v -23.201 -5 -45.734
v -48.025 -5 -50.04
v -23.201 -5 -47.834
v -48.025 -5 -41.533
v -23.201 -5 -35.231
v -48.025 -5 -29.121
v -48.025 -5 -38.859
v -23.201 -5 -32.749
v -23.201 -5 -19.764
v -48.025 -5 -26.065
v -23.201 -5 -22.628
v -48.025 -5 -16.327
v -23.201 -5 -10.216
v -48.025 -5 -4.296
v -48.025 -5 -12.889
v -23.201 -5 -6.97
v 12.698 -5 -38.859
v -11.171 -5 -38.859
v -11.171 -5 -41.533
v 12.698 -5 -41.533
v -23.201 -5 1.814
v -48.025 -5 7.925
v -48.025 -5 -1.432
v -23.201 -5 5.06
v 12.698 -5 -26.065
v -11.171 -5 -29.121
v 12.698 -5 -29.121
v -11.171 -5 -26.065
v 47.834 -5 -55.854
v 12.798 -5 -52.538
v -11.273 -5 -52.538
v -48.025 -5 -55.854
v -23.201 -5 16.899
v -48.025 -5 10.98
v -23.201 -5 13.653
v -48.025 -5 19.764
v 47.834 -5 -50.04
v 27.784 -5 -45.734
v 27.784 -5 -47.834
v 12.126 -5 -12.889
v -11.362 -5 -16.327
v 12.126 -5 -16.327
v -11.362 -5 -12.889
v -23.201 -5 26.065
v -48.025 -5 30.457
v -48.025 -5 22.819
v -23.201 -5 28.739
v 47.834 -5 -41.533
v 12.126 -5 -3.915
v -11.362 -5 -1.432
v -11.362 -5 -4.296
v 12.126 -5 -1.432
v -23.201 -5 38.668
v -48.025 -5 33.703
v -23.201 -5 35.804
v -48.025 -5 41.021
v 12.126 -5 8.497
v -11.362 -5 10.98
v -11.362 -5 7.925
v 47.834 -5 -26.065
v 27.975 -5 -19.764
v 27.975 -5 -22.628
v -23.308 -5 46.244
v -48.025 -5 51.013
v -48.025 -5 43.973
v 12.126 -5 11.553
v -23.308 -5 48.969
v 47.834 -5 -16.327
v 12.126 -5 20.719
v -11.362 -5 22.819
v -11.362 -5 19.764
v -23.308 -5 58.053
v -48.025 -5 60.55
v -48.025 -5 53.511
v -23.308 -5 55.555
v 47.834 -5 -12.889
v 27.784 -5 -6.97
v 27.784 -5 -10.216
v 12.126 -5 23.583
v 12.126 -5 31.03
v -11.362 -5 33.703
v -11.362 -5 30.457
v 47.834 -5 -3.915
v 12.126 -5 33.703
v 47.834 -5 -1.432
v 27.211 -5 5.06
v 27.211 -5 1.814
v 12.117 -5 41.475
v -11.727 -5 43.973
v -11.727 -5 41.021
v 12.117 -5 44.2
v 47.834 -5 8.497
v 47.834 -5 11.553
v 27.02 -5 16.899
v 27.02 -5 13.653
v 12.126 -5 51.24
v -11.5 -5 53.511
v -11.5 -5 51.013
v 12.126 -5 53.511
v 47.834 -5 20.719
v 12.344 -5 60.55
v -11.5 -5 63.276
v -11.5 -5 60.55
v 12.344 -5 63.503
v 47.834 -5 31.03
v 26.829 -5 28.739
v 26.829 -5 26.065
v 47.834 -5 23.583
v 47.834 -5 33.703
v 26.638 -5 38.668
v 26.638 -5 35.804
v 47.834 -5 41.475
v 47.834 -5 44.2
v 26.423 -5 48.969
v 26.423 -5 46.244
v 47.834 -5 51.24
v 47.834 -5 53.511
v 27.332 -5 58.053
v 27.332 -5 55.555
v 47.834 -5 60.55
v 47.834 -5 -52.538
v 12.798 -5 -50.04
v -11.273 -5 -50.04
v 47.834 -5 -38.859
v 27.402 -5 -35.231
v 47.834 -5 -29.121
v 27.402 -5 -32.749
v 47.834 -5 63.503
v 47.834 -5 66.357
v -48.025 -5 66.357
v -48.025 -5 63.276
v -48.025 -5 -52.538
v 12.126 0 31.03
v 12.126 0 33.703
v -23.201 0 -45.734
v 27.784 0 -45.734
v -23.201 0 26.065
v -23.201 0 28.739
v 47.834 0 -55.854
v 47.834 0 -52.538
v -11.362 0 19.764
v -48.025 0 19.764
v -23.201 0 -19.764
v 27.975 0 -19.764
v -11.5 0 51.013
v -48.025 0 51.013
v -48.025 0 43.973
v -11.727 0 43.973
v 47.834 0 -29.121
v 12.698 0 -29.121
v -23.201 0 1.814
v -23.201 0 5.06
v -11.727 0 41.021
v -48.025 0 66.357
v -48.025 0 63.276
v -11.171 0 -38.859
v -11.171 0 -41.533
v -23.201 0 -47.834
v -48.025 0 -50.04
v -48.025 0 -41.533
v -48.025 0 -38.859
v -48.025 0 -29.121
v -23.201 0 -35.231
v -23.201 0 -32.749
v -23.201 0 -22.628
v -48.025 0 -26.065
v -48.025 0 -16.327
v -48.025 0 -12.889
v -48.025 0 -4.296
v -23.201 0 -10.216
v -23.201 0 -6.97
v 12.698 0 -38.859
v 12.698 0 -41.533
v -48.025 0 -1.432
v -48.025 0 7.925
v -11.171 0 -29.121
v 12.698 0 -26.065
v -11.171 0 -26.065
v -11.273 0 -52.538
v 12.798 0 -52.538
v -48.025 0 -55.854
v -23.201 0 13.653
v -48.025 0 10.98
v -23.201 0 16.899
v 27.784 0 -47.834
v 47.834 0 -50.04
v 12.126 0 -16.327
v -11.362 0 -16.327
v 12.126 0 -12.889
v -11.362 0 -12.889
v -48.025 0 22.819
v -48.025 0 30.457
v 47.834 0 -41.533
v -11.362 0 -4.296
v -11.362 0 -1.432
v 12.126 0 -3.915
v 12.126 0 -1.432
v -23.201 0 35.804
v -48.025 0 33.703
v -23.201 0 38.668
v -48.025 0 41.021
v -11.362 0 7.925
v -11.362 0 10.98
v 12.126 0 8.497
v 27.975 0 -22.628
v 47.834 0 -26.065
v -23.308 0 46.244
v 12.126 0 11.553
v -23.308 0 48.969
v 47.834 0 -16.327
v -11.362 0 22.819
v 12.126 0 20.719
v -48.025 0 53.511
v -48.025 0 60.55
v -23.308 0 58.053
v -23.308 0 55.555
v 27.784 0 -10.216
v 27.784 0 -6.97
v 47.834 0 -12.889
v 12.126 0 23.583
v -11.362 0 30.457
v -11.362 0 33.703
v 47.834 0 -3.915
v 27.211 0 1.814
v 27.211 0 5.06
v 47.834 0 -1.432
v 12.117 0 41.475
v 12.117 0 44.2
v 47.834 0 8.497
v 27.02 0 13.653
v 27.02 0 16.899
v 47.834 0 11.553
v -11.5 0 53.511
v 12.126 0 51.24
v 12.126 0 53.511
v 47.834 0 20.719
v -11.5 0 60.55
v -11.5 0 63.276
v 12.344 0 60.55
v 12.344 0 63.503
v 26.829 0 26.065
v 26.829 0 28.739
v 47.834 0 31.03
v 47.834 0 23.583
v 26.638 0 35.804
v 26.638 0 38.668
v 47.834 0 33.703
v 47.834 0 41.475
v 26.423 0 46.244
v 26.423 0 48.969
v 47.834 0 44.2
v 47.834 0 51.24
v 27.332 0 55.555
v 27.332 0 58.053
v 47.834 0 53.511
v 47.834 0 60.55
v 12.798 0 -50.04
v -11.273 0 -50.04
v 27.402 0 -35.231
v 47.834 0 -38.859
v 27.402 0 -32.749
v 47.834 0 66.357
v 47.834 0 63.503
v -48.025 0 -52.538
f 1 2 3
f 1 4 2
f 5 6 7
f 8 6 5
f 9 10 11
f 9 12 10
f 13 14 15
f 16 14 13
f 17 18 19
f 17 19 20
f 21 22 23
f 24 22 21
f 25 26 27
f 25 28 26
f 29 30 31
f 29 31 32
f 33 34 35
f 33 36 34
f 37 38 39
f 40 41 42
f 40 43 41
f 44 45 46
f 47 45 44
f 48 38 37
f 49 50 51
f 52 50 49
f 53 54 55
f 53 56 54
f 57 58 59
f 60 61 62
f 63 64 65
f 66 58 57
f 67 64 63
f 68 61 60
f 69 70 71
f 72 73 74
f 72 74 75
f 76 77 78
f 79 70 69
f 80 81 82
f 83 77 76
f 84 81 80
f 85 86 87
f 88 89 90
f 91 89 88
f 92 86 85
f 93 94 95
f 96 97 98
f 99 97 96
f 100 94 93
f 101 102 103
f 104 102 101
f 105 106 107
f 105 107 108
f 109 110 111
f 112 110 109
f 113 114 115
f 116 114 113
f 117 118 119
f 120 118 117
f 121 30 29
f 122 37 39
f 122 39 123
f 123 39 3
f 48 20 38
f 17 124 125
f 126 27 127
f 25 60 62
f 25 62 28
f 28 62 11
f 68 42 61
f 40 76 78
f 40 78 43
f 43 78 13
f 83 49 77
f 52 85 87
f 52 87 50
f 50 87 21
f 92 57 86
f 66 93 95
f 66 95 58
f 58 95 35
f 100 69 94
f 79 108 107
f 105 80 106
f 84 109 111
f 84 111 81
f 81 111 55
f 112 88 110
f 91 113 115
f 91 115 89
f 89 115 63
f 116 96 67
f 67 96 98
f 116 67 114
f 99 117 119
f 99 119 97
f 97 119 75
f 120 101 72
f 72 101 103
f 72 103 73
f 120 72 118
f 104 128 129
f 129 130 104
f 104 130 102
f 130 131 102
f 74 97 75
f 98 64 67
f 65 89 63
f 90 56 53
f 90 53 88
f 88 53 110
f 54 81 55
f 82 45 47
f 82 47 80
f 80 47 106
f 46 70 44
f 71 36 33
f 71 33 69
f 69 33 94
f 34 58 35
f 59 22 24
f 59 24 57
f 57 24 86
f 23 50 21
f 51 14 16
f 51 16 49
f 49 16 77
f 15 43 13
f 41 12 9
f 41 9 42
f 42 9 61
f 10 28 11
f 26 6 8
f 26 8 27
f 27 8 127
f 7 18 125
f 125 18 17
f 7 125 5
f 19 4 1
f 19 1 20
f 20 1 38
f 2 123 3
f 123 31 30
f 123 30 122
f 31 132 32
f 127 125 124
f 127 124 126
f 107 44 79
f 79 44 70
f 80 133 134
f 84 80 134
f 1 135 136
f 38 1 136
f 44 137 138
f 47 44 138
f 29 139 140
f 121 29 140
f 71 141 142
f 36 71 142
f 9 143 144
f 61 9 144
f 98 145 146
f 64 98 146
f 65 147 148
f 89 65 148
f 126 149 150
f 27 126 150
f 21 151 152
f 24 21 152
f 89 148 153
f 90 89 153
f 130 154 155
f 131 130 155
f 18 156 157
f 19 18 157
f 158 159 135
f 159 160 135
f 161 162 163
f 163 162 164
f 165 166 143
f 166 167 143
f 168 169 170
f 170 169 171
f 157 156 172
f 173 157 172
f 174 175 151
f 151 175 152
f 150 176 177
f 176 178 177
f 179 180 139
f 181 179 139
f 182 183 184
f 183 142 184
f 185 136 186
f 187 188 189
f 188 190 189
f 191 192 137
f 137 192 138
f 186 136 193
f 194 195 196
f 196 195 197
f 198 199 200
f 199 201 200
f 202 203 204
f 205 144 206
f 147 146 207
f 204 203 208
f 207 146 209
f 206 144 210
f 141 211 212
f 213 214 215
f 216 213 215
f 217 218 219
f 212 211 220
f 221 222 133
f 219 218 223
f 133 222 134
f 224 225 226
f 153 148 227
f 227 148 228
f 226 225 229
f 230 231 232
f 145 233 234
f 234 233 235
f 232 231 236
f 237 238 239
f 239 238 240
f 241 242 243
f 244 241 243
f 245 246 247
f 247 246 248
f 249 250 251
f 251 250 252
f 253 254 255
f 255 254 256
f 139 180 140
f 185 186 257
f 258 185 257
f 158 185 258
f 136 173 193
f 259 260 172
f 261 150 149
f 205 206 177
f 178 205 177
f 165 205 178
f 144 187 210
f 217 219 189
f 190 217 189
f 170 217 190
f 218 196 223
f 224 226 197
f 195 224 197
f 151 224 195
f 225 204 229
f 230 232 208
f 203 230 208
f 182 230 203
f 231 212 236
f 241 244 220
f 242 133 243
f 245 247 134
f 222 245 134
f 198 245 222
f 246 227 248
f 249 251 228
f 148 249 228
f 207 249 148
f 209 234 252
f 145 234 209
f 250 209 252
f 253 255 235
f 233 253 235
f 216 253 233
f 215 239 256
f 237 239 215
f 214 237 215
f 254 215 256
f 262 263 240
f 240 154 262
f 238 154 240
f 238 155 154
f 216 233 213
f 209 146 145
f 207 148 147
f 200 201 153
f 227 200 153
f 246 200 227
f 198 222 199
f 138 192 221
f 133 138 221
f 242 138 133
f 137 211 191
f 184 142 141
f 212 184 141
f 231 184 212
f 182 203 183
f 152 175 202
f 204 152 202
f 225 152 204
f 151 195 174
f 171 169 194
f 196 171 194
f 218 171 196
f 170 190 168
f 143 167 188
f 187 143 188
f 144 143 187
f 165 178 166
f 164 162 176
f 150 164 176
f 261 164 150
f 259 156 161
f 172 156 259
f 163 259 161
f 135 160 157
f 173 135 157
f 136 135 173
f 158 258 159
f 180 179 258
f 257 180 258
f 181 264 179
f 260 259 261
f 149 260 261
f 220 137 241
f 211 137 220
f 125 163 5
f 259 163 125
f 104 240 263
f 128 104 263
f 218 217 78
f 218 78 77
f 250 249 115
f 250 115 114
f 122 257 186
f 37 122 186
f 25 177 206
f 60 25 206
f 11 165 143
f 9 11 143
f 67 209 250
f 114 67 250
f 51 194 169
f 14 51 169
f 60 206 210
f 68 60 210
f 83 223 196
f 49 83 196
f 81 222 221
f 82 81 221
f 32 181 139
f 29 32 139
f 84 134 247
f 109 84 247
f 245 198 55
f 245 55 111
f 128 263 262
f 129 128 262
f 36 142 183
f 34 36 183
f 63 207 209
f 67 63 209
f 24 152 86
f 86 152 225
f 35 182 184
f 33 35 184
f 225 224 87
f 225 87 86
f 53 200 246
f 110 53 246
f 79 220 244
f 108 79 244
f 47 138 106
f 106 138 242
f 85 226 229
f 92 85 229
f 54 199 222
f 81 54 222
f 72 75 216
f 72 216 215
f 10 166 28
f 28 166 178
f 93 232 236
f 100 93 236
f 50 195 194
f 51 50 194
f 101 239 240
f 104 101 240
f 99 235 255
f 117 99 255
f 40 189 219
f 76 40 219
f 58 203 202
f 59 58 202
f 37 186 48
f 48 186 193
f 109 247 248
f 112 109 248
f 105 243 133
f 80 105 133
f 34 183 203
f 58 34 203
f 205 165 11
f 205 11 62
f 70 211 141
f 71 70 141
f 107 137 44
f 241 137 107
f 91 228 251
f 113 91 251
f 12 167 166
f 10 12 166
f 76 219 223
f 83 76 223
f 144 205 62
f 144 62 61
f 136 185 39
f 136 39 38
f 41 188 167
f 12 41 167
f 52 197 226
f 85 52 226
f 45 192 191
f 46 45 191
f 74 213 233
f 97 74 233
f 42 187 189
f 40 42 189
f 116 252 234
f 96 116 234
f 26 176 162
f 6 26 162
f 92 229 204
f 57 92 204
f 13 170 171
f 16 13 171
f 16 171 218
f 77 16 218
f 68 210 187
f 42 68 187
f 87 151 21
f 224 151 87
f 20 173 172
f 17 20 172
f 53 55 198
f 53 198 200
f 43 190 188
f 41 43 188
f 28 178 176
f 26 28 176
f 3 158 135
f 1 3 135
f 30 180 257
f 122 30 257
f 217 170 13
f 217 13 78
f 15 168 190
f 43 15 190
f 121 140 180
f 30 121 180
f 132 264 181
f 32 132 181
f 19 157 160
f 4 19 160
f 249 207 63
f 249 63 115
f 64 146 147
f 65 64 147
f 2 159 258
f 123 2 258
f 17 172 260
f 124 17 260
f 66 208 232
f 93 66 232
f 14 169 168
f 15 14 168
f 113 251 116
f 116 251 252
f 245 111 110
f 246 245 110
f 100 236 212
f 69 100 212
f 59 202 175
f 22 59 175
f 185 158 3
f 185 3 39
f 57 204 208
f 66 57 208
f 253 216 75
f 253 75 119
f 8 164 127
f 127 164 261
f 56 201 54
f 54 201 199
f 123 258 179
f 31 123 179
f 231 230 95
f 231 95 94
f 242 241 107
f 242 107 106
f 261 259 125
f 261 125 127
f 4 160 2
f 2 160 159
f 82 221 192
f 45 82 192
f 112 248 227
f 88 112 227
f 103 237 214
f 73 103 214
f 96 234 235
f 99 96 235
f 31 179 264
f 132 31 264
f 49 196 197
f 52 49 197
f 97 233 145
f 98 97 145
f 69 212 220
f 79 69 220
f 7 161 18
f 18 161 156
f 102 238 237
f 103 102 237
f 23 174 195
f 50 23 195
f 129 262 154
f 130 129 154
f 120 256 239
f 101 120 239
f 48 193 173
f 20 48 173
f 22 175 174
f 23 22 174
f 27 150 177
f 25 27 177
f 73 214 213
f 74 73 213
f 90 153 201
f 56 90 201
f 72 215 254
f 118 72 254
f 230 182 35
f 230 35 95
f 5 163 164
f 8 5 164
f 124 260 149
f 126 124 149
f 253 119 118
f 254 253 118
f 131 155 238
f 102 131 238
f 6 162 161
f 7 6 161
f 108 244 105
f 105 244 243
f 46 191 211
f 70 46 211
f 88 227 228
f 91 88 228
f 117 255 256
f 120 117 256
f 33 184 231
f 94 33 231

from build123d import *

# Parameters (mm, degrees)
F0_W     = 50.984893
F0_H     = 2.100501
F0_W_2   = 50.602986
F0_H_2   = 2.482414
F0_W_3   = 51.175848
F0_H_3   = 2.86432
F0_H_4   = 3.246229
F0_W_4   = 50.412029
F0_W_5   = 50.221075
F0_W_6   = 50.030118
F0_H_5   = 2.673368
F0_W_7   = 49.839167
F0_H_6   = 2.864324
F0_W_8   = 49.731534
F0_H_7   = 2.725012
F0_W_9   = 50.639872
F0_H_8   = 2.49793
F1_DEPTH = 5


with BuildPart() as f1:
    # F0 (on Front) → F1 (new body)
    with BuildSketch(Plane.XZ):
        Polygon((-48.025098, -52.537646), (-48.025098, -55.854235), (47.834139, -55.854235), (47.834139, -52.537646), (12.798216, -52.537646), (12.798216, -50.039716), (47.834139, -50.039716), (47.834139, -41.532639), (12.698486, -41.532639), (12.698486, -38.859274), (47.834139, -38.859274), (47.834139, -29.120585), (12.698486, -29.120585), (12.698486, -26.06531), (47.834139, -26.06531), (47.834139, -16.326623), (12.125621, -16.326623), (12.125621, -12.889439), (47.834139, -12.889439), (47.834139, -3.91457), (12.125621, -3.91457), (12.125621, -1.43216), (47.834139, -1.43216), (47.834139, 8.497482), (12.125621, 8.497482), (12.125621, 11.552757), (47.834139, 11.552757), (47.834139, 20.71858), (12.125621, 20.71858), (12.125621, 23.5829), (47.834139, 23.5829), (47.834139, 31.030132), (12.125621, 31.030132), (12.125621, 33.703495), (47.834139, 33.703495), (47.834139, 41.475393), (12.116962, 41.475393), (12.116962, 44.200405), (47.834139, 44.200405), (47.834139, 51.240031), (12.125621, 51.240031), (12.125621, 53.510878), (47.834139, 53.510878), (47.834139, 60.5505), (12.344047, 60.5505), (12.344047, 63.502602), (47.834139, 63.502602), (47.834139, 66.356741), (-48.025098, 66.356741), (-48.025098, 63.275516), (-11.49984, 63.275516), (-11.49984, 60.5505), (-48.025098, 60.5505), (-48.025098, 53.510878), (-11.49984, 53.510878), (-11.49984, 51.012948), (-48.025098, 51.012948), (-48.025098, 43.973323), (-11.726924, 43.973323), (-11.726924, 41.021224), (-48.025098, 41.021224), (-48.025098, 33.703495), (-11.361802, 33.703495), (-11.361802, 30.457268), (-48.025098, 30.457268), (-48.025098, 22.819081), (-11.361802, 22.819081), (-11.361802, 19.763807), (-48.025098, 19.763807), (-48.025098, 10.979893), (-11.361802, 10.979893), (-11.361802, 7.924618), (-48.025098, 7.924618), (-48.025098, -1.43216), (-11.361802, -1.43216), (-11.361802, -4.29648), (-48.025098, -4.29648), (-48.025098, -12.889439), (-11.361802, -12.889439), (-11.361802, -16.326623), (-48.025098, -16.326623), (-48.025098, -26.06531), (-11.170847, -26.06531), (-11.170847, -29.120585), (-48.025098, -29.120585), (-48.025098, -38.859274), (-11.170847, -38.859274), (-11.170847, -41.532639), (-48.025098, -41.532639), (-48.025098, -50.039716), (-11.272755, -50.039716), (-11.272755, -52.537646), align=None)
        with Locations((2.291455, -46.783892)):
            Rectangle(F0_W, F0_H, mode=Mode.SUBTRACT)
        with Locations((2.100502, -33.989929)):
            Rectangle(F0_W_2, F0_H_2, mode=Mode.SUBTRACT)
        with Locations((2.386933, -21.195967)):
            Rectangle(F0_W_3, F0_H_3, mode=Mode.SUBTRACT)
        with Locations((2.291455, -8.592959)):
            Rectangle(F0_W, F0_H_4, mode=Mode.SUBTRACT)
        with Locations((2.005024, 3.437183)):
            Rectangle(F0_W_4, F0_H_4, mode=Mode.SUBTRACT)
        with Locations((1.909546, 15.276373)):
            Rectangle(F0_W_5, F0_H_4, mode=Mode.SUBTRACT)
        with Locations((1.814068, 27.401994)):
            Rectangle(F0_W_6, F0_H_5, mode=Mode.SUBTRACT)
        with Locations((1.718592, 37.236158)):
            Rectangle(F0_W_7, F0_H_6, mode=Mode.SUBTRACT)
        with Locations((1.557527, 47.606677)):
            Rectangle(F0_W_8, F0_H_7, mode=Mode.SUBTRACT)
        with Locations((2.011696, 56.803601)):
            Rectangle(F0_W_9, F0_H_8, mode=Mode.SUBTRACT)
    extrude(amount=F1_DEPTH)


solid = f1.part
